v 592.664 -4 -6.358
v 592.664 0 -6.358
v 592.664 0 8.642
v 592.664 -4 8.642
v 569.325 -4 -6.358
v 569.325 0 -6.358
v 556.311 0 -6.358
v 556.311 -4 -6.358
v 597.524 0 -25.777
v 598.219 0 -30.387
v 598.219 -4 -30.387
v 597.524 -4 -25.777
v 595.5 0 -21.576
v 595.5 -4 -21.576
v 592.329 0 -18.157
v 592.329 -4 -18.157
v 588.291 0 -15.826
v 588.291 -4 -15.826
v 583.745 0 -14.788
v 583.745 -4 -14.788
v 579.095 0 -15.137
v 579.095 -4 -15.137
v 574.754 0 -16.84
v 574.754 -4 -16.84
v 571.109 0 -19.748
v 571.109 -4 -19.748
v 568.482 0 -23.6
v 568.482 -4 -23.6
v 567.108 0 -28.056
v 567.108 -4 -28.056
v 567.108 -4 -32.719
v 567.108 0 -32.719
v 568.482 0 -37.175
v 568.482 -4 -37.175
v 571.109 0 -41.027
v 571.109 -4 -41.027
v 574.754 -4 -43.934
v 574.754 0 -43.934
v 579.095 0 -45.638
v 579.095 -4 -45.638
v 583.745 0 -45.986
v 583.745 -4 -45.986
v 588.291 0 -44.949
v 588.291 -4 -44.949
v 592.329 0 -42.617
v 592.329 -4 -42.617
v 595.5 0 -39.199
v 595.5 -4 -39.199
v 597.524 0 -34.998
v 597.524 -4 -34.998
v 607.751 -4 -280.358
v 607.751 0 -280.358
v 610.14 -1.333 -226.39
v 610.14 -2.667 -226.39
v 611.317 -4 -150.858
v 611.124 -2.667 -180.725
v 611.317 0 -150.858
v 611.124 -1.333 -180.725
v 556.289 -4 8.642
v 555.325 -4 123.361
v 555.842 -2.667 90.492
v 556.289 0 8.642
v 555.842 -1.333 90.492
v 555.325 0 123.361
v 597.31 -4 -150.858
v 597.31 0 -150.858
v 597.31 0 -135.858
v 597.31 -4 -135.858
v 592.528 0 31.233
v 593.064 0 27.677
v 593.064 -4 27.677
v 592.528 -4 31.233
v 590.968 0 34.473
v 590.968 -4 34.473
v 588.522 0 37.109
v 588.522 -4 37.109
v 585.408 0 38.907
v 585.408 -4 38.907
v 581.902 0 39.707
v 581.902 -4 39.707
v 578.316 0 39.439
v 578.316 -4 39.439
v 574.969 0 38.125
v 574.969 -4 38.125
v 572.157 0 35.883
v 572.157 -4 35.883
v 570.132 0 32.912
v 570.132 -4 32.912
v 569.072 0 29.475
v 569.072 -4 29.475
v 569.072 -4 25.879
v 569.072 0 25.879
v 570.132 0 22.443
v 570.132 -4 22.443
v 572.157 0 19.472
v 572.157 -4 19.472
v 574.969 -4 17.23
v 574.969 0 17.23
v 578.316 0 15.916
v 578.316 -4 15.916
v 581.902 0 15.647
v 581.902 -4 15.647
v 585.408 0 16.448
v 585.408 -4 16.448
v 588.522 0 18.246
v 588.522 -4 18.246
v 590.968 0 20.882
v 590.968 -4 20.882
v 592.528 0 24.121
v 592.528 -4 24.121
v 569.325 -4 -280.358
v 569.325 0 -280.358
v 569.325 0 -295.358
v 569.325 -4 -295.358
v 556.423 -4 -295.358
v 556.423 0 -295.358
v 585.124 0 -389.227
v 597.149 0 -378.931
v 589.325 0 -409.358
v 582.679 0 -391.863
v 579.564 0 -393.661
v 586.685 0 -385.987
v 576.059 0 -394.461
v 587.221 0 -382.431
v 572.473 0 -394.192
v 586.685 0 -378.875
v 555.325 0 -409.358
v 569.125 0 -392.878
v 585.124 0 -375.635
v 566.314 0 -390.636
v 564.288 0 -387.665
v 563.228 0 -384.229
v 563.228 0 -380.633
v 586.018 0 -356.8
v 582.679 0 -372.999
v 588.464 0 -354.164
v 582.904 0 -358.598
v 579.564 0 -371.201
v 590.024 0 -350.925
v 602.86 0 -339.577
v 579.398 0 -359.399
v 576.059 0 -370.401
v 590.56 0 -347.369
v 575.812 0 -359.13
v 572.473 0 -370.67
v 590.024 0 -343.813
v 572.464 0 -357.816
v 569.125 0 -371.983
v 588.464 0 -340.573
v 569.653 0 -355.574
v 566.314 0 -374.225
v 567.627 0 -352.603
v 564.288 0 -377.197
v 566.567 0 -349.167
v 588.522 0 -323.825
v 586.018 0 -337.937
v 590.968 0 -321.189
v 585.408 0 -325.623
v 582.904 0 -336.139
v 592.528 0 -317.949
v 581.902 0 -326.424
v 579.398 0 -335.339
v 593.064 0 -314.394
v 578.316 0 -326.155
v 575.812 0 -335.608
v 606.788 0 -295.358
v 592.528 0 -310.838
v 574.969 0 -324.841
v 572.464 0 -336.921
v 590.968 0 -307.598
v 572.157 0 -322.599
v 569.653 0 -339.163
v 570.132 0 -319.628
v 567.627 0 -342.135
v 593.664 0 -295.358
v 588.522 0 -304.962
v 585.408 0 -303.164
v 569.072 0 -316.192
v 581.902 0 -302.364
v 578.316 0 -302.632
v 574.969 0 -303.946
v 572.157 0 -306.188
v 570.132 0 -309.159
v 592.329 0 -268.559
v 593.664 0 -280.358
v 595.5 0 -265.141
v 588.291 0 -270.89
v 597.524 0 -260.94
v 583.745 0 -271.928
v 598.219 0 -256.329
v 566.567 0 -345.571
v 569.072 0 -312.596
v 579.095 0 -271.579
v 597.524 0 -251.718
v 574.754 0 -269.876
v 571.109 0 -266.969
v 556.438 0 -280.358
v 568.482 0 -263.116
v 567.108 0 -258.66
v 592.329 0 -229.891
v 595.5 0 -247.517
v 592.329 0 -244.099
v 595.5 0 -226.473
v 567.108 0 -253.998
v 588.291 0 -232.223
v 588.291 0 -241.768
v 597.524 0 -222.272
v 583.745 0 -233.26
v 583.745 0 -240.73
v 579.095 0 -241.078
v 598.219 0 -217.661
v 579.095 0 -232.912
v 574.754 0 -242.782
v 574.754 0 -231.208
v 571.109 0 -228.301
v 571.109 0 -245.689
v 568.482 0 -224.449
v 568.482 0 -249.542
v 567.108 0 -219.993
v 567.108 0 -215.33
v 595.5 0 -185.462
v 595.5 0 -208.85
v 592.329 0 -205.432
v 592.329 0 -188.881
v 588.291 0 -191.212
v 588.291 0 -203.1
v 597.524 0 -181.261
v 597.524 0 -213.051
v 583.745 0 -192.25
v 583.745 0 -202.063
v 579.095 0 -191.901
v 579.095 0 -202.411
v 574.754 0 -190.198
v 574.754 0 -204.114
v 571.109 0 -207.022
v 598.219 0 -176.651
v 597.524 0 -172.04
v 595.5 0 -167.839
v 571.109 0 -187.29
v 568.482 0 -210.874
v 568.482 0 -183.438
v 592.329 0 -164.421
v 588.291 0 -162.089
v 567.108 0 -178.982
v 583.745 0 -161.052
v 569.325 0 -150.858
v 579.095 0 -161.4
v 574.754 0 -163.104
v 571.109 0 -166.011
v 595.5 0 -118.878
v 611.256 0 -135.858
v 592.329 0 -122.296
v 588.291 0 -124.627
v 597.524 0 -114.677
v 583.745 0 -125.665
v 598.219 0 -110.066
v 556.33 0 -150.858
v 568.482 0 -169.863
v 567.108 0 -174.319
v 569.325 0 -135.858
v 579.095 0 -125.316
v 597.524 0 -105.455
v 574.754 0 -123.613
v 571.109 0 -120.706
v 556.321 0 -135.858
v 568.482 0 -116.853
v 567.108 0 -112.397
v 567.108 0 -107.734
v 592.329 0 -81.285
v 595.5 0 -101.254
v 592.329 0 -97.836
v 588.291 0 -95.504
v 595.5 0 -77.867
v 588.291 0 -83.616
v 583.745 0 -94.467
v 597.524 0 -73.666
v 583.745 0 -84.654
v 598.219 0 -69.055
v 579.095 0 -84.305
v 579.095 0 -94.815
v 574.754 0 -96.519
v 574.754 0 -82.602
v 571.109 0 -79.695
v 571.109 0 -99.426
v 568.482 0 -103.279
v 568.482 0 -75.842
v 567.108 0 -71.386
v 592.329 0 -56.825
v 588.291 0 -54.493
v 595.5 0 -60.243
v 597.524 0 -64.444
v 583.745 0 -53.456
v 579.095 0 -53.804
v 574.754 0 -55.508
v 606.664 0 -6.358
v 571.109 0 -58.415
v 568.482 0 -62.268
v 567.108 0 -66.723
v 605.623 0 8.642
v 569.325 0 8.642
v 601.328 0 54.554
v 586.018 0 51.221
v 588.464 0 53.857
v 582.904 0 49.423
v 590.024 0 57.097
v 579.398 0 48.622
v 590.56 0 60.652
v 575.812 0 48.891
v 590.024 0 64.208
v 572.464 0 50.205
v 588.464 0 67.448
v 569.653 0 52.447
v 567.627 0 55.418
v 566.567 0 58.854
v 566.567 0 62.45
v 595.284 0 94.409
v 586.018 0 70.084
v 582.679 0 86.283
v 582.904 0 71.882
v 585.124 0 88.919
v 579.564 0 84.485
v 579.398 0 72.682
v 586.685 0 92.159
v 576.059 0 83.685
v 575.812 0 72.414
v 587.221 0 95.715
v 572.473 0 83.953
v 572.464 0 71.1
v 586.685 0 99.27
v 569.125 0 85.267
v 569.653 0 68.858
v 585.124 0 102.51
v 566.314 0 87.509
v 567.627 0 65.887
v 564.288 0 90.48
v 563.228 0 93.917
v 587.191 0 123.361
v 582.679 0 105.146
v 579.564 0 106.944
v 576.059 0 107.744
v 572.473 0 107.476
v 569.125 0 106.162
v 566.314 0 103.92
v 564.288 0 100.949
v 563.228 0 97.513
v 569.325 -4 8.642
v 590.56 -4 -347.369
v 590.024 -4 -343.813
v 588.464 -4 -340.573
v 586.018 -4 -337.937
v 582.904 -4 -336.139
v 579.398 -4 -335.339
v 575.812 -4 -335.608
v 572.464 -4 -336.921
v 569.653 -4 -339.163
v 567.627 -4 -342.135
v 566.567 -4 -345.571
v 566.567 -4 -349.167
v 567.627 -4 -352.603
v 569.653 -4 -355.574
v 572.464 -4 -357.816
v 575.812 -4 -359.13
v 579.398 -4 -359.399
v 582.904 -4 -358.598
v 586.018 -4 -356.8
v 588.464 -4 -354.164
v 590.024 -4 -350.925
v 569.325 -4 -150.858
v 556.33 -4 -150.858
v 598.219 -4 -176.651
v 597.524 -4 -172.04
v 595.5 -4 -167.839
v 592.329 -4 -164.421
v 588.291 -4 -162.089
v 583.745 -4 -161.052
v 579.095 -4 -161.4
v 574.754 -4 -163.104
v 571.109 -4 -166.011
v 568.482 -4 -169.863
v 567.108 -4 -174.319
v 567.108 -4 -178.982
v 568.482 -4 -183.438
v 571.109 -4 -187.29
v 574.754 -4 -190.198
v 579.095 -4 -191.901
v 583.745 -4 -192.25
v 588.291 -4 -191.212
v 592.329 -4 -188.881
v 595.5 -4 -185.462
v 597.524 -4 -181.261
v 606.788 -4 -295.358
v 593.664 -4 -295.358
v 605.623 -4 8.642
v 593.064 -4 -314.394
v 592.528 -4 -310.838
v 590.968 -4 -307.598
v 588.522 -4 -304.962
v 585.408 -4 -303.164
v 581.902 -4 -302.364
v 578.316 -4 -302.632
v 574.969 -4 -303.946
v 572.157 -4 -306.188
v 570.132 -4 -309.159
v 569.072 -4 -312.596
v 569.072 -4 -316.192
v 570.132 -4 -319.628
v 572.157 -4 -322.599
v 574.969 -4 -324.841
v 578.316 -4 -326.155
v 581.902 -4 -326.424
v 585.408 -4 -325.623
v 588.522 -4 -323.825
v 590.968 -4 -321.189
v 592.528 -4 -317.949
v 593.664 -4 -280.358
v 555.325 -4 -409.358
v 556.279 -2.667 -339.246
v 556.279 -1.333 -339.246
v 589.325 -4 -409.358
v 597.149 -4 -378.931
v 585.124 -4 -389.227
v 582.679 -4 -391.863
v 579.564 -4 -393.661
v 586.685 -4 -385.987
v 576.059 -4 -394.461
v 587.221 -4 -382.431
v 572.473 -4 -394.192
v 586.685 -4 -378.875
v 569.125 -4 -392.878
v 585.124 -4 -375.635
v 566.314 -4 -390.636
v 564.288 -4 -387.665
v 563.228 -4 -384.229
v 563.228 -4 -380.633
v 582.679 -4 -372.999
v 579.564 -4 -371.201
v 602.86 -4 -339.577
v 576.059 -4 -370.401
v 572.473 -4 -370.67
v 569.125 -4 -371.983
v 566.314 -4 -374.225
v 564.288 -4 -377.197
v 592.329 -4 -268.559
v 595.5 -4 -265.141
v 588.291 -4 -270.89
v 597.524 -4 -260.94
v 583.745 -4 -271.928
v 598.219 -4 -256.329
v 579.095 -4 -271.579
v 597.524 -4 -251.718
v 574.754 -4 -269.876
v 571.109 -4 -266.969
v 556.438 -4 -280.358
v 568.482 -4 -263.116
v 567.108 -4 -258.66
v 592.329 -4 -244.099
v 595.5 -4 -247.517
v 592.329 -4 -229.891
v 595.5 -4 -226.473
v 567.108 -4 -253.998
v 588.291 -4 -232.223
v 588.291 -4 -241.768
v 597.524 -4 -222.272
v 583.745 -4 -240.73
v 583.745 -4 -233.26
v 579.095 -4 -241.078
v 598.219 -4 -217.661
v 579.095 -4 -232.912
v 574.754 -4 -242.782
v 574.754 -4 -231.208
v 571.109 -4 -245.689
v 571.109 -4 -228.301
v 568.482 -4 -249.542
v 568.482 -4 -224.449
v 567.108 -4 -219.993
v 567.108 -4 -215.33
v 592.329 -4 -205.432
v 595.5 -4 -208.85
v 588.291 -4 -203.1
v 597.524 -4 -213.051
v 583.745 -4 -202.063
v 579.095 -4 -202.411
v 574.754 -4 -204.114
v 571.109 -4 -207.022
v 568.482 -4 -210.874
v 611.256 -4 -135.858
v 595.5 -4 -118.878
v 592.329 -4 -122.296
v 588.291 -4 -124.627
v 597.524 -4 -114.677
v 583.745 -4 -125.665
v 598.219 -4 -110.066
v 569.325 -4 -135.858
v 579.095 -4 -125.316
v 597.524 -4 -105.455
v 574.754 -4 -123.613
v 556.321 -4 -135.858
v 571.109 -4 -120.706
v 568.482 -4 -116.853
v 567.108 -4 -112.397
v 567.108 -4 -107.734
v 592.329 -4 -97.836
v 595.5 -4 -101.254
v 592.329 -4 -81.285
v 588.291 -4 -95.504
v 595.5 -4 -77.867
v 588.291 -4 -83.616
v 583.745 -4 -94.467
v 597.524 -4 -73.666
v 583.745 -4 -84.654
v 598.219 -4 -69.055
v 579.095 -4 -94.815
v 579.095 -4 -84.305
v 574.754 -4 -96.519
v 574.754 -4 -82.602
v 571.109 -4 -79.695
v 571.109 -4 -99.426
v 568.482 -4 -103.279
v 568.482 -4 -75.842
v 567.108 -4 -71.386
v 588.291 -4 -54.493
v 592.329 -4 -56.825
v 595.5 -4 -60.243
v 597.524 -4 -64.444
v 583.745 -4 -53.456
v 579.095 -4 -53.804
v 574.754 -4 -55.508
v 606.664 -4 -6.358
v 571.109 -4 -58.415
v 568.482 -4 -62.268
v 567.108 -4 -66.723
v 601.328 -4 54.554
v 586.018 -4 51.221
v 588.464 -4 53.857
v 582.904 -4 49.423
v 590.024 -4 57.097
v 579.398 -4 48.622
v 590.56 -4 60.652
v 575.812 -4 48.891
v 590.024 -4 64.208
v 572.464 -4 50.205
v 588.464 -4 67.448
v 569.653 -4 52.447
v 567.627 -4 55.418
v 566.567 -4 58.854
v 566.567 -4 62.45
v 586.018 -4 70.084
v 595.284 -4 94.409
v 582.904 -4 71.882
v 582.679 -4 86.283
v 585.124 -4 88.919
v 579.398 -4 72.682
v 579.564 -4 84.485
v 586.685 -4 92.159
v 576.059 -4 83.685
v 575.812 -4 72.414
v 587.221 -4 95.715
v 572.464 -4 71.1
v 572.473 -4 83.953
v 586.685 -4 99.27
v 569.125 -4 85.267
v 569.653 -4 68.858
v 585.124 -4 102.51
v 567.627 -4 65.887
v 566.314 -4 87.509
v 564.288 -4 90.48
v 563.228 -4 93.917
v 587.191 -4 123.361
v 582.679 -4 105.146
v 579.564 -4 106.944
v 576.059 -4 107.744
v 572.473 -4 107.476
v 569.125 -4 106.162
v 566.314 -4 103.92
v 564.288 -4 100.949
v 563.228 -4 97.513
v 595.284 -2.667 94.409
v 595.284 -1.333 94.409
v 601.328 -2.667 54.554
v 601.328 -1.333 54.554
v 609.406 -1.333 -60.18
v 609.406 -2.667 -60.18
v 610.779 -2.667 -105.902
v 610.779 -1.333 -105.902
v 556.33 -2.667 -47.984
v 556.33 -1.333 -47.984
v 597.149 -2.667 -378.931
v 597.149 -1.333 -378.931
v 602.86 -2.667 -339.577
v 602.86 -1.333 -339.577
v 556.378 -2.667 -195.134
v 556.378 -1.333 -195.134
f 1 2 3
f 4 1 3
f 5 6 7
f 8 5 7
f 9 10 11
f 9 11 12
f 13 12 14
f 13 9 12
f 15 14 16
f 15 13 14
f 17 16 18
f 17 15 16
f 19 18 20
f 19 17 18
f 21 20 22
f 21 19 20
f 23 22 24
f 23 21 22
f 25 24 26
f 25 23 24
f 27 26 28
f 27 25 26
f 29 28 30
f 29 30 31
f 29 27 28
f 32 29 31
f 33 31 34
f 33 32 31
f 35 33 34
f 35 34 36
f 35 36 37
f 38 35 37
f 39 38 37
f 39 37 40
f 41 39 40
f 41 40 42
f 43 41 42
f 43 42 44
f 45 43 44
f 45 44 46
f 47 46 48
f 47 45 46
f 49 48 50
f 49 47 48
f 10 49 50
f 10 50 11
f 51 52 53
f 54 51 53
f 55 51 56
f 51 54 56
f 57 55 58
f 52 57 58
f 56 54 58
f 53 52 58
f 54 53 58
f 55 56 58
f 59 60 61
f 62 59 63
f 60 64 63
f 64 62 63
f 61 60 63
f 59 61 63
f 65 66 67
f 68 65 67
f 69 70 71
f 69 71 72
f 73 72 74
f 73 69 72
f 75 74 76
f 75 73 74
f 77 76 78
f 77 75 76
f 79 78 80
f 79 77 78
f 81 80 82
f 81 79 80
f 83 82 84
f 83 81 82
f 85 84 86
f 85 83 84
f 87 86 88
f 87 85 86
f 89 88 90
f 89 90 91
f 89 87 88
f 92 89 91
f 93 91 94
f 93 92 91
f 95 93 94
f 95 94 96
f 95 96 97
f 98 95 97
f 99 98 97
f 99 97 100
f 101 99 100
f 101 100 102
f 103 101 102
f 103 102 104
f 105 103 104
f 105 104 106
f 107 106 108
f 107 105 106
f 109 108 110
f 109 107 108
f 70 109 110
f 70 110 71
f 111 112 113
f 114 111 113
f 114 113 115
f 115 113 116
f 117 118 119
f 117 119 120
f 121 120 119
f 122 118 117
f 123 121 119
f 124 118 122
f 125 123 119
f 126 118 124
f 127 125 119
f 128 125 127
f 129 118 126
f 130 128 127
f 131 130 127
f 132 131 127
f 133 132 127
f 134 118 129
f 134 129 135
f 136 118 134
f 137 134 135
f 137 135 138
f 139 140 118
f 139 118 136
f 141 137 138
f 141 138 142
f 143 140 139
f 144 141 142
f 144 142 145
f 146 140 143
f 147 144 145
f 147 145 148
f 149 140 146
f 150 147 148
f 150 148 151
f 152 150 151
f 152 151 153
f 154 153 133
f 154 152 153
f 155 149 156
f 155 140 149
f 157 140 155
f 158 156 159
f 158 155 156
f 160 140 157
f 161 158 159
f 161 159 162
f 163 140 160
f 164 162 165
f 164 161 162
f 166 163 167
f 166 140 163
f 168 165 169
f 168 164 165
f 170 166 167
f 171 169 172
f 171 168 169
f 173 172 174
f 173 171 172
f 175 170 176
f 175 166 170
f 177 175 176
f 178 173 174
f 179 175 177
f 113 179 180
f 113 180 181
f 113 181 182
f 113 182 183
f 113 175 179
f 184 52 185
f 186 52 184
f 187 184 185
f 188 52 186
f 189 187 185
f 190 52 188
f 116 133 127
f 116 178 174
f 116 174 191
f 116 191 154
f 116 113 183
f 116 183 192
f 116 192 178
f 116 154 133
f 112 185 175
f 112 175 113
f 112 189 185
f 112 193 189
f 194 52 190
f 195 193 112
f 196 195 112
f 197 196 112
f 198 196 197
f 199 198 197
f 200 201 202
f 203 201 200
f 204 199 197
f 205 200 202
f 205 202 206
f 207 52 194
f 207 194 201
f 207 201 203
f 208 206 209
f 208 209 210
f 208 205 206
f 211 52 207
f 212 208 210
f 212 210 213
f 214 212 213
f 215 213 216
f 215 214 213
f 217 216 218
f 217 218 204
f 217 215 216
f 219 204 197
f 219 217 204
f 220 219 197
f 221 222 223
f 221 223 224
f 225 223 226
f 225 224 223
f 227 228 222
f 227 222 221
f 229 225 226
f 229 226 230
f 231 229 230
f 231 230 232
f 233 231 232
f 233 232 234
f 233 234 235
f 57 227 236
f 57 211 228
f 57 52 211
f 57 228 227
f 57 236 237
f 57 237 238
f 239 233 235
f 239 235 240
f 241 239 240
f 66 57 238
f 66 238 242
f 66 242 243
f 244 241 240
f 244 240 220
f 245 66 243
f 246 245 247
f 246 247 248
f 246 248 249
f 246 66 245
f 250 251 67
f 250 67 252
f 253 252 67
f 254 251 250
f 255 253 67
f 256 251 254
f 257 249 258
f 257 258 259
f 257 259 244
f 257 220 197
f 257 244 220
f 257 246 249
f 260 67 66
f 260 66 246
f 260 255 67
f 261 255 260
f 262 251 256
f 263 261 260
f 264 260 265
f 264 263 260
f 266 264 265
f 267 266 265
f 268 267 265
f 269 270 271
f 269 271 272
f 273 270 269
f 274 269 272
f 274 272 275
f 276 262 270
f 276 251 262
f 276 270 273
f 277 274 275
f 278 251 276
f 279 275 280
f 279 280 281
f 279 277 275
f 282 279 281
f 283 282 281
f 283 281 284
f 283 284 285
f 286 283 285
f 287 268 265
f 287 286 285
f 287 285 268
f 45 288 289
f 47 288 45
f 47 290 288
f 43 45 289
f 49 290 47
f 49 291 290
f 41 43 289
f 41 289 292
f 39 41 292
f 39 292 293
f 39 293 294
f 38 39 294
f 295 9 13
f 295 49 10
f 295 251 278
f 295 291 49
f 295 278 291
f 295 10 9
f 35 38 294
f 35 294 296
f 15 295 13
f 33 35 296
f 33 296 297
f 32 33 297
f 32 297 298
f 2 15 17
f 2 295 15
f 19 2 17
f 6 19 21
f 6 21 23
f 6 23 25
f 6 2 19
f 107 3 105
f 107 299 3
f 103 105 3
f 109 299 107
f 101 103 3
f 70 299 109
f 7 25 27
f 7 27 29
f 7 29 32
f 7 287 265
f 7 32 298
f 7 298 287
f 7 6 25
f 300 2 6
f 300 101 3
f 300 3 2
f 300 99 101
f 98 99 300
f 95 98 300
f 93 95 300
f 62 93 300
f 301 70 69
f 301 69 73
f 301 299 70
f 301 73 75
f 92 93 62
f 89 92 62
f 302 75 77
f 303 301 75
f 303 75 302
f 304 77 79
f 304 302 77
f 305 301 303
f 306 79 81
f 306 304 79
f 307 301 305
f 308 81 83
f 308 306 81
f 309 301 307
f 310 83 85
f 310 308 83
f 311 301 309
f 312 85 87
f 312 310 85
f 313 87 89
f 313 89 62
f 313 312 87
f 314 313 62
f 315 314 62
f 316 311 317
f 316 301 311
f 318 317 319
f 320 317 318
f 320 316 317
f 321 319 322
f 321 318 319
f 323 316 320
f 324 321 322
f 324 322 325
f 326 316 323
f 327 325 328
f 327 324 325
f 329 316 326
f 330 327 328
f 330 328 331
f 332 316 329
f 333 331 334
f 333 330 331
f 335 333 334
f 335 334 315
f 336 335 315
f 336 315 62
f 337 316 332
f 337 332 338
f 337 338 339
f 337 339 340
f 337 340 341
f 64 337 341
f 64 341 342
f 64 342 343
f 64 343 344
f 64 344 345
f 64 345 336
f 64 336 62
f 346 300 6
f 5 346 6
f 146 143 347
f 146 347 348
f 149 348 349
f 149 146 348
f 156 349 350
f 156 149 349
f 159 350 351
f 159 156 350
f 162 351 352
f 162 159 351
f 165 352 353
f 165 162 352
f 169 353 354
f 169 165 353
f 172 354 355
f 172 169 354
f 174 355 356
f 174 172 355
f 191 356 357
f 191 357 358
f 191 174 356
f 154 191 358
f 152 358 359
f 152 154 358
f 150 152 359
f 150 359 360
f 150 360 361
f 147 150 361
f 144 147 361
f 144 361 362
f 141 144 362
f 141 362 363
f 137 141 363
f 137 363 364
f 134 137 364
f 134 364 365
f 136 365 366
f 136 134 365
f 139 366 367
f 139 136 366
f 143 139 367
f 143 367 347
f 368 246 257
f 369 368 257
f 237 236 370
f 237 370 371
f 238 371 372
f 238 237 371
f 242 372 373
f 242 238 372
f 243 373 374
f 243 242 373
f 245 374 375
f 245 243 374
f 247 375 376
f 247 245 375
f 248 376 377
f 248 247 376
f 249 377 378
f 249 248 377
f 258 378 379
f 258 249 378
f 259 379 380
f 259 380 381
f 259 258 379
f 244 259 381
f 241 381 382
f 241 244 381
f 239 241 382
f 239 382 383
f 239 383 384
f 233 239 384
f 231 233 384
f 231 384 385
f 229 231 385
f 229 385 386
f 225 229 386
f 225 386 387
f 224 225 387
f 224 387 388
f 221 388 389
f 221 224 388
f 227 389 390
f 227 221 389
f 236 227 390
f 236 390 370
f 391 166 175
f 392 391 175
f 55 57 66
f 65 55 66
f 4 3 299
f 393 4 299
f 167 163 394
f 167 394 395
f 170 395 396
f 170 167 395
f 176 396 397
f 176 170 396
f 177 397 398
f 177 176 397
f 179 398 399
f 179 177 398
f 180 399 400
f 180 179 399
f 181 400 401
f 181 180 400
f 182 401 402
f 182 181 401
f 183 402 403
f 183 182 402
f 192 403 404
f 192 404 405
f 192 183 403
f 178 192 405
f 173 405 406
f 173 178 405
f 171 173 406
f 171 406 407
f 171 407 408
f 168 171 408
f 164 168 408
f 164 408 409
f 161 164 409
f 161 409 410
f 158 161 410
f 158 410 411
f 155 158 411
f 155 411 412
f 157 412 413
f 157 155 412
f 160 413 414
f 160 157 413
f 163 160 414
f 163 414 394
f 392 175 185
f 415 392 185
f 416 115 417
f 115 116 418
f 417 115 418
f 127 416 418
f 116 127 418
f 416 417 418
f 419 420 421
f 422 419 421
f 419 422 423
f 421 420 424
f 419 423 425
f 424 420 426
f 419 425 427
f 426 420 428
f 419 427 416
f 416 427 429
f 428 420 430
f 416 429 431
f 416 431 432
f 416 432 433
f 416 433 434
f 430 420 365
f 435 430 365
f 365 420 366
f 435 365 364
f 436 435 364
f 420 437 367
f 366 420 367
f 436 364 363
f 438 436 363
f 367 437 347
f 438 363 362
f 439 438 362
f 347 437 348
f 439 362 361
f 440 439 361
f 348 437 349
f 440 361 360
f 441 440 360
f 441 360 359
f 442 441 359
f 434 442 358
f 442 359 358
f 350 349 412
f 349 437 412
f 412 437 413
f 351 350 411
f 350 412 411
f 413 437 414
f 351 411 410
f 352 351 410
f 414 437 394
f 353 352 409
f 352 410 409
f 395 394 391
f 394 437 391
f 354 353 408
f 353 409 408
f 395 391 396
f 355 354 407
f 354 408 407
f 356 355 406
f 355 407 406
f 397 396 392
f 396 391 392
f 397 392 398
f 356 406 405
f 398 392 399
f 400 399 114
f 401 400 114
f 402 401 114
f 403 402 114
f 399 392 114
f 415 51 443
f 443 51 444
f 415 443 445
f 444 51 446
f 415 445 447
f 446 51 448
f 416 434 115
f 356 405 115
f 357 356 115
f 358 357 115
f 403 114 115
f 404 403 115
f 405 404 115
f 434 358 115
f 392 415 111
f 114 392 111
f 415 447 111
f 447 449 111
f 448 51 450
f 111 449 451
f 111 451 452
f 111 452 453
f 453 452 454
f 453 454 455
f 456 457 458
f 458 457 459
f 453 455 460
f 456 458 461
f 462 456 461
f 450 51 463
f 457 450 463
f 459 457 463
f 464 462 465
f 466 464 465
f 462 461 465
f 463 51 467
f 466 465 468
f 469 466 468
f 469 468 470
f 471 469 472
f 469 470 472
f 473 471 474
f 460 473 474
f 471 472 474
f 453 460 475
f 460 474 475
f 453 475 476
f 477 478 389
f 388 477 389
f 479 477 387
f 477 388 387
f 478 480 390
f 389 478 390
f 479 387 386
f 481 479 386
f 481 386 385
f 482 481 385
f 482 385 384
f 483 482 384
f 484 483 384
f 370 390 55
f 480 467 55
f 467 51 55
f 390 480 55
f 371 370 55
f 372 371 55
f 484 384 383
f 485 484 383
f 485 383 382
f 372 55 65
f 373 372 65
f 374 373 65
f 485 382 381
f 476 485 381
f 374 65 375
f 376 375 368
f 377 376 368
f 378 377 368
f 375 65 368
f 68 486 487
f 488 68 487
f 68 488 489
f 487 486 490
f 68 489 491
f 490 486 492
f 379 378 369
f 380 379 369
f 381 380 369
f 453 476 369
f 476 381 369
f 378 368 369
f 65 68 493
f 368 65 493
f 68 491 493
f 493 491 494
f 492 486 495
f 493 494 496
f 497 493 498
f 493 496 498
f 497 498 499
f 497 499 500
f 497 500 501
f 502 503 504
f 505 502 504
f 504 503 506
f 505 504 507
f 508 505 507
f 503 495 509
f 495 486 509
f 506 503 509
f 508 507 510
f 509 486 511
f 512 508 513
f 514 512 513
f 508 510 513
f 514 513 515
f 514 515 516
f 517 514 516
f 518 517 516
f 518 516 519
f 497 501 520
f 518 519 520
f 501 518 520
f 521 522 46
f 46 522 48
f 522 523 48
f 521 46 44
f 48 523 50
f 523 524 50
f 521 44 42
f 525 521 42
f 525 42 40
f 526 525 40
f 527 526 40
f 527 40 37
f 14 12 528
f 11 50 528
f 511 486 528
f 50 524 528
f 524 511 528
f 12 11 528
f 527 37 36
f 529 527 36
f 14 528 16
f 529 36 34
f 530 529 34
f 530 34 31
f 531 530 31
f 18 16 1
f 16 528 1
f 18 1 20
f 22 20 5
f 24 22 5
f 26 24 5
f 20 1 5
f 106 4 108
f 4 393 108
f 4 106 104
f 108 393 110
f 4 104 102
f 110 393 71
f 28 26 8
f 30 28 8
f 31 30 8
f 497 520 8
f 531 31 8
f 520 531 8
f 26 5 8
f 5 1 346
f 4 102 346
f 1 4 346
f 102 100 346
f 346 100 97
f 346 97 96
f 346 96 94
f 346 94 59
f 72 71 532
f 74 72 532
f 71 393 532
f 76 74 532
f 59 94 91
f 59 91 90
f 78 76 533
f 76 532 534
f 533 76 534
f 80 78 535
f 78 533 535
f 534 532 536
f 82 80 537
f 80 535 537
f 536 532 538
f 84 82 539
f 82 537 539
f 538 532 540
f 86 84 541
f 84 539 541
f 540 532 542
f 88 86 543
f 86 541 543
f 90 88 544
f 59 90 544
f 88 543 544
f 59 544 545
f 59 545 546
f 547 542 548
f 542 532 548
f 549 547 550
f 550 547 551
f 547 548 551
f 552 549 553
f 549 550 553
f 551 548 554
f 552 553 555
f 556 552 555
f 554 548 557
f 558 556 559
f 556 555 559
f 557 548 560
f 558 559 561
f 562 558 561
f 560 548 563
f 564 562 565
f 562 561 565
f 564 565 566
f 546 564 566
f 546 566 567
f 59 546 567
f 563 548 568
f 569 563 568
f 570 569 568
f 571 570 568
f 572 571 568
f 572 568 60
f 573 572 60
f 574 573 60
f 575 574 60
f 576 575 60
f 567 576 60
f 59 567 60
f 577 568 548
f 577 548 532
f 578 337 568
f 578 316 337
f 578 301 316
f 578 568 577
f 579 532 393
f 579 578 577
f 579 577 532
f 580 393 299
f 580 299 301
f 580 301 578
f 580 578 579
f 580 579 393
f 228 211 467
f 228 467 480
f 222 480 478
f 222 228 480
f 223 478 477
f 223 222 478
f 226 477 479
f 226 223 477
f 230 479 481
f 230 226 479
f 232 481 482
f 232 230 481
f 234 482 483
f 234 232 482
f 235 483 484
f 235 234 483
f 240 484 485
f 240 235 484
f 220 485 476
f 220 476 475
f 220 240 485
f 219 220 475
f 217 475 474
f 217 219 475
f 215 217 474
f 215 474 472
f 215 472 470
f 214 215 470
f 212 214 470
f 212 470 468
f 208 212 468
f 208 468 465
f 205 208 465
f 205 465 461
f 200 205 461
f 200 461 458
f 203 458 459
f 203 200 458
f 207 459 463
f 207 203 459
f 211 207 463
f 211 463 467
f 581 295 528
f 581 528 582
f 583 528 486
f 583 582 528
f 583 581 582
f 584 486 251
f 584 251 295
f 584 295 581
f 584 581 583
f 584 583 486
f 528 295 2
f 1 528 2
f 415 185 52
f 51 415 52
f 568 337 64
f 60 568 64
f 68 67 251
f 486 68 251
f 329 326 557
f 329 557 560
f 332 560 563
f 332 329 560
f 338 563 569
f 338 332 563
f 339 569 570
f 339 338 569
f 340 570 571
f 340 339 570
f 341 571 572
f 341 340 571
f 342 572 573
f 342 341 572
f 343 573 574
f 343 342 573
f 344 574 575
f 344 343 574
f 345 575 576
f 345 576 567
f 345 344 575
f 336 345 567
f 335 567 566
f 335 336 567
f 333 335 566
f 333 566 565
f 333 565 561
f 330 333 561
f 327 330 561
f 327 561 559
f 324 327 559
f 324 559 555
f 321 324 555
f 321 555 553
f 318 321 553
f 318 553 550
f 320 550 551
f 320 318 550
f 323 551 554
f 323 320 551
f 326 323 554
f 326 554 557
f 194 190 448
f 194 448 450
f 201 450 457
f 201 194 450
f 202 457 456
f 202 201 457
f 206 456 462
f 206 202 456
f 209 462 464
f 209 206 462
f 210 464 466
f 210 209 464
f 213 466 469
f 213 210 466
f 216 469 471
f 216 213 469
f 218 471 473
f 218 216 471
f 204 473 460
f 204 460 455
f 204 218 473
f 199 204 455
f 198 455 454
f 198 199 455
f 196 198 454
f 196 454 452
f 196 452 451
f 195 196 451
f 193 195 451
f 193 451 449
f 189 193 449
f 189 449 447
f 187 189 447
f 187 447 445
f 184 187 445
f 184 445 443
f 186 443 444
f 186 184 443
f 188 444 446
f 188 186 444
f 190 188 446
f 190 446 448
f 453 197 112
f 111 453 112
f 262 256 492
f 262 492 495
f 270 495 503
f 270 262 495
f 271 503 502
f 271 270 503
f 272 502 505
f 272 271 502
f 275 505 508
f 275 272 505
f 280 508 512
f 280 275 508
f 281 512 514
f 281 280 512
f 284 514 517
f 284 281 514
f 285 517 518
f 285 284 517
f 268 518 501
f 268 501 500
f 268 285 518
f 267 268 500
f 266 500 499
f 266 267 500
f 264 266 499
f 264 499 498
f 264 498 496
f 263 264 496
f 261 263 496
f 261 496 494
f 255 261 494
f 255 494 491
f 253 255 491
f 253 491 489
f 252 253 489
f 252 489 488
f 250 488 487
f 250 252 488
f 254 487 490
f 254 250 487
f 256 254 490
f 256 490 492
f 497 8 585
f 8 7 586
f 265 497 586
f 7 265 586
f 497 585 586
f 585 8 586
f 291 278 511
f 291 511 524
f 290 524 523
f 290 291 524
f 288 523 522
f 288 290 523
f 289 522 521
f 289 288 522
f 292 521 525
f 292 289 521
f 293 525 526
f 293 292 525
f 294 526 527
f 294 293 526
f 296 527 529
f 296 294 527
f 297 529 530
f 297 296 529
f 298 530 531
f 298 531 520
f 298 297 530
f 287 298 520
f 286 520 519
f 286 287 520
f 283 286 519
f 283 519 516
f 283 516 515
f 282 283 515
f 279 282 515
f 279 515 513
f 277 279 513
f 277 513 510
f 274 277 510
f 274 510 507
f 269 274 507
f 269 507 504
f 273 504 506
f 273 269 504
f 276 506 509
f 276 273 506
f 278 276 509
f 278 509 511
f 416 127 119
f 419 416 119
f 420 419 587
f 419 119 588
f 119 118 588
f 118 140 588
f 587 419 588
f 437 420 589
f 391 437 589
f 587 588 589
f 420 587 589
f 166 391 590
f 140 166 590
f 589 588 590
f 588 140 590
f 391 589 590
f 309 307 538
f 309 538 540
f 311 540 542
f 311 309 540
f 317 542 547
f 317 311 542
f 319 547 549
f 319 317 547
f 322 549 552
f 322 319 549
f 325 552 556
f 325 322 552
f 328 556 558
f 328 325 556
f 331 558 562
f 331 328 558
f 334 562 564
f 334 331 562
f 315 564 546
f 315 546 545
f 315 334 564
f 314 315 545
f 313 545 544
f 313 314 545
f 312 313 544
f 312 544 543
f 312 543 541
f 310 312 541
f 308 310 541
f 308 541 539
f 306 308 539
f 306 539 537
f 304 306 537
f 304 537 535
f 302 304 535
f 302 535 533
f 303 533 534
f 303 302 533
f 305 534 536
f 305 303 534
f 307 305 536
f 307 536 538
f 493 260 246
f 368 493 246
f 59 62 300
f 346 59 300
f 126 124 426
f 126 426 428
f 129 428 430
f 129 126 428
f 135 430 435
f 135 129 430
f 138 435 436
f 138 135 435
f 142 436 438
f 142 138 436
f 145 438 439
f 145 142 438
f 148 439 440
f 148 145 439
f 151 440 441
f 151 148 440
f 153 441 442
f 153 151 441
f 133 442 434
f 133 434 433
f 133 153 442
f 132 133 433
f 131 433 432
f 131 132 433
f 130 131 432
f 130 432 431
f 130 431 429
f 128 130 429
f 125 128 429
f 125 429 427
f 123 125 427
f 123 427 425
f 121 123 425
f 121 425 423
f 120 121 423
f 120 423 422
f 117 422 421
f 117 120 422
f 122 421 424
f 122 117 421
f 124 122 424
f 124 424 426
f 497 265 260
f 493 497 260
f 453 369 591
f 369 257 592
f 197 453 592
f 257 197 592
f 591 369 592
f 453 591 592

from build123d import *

# Parameters (mm, degrees)
F0_R     = 15.6427266016
F0_R_2   = 12.0636627394
F1_DEPTH = 4


# Not quite as in the source:
# - a feature names something its author has since deleted; it is built from what else it names


with BuildPart() as f1:
    # F0 (on Front) → F1 (new body)
    with BuildSketch(Plane.XZ):
        with BuildLine():
            add(Edge.make_bspline(
                [(606.664408162, -6.3581708061), (610.2484126071, -61.6736918338), (611.0695149221, -116.339928141), (611.2557314215, -135.8581708061)],
                knots=[116.1389128405, 116.1389128405, 116.1389128405, 116.1389128405, 238.5747877883, 238.5747877883, 238.5747877883, 238.5747877883], degree=3))
            Line((606.664408162, -6.3581708061), (592.664408162, -6.3581708061))
            Line((592.664408162, -6.3581708061), (592.664408162, 1.1418291939))
            Line((592.664408162, 1.1418291939), (569.3247318268, 1.1418291939))
            Line((569.3247318268, 1.1418291939), (569.3247318268, -6.3581708061))
            Line((569.3247318268, -6.3581708061), (556.3105202547, -6.3581708061))
            add(Edge.make_bspline(
                [(556.3105202547, -6.3581708062), (556.3560675182, -46.8595634464), (556.3040983749, -91.0874507126), (556.321195241, -135.8581708062)],
                knots=[0.2731602209, 0.2731602209, 0.2731602209, 0.2731602209, 0.4883298337, 0.4883298337, 0.4883298337, 0.4883298337], degree=3))
            Line((556.321195241, -135.8581708061), (569.3247318268, -135.8581708061))
            Line((569.3247318268, -135.8581708061), (569.3247318268, -143.3581708061))
            Line((569.3247318268, -143.3581708061), (597.3095011307, -143.3581708061))
            Line((597.3095011307, -143.3581708061), (597.3095011307, -135.8581708061))
            Line((597.3095011307, -135.8581708061), (611.2557314215, -135.8581708061))
        make_face()
        with Locations((582.5758576393, -110.06578058)):
            Circle(F0_R, mode=Mode.SUBTRACT)
        with Locations((582.5758576393, -69.0548494458)):
            Circle(F0_R, mode=Mode.SUBTRACT)
        with Locations((582.5758576393, -30.3874015808)):
            Circle(F0_R, mode=Mode.SUBTRACT)
        with BuildLine():
            add(Edge.make_bspline(
                [(587.1910579171, 123.3613954191), (596.407592129, 101.4742246466), (602.1031854422, 55.9678384662), (605.6225226157, 8.6418291939)],
                knots=[0, 0, 0, 0, 105.0647905127, 105.0647905127, 105.0647905127, 105.0647905127], degree=3))
            Line((587.1910579171, 123.3613954191), (563.1910579171, 123.3613954191))
            Line((563.1910579171, 123.3613954191), (555.3247318268, 123.3613954191))
            add(Edge.make_bspline(
                [(555.3247318268, 123.3613954191), (555.9675431408, 93.7069693731), (556.2055580917, 53.8758795815), (556.2885566673, 8.6418291939)],
                knots=[0, 0, 0, 0, 0.2462769496, 0.2462769496, 0.2462769496, 0.2462769496], degree=3))
            Line((556.2885566673, 8.6418291939), (569.3247318268, 8.6418291939))
            Line((569.3247318268, 8.6418291939), (569.3247318268, 1.1418291939))
            Line((569.3247318268, 1.1418291939), (592.664408162, 1.1418291939))
            Line((592.664408162, 1.1418291939), (592.664408162, 8.6418291939))
            Line((592.664408162, 8.6418291939), (605.6225226157, 8.6418291939))
        make_face()
        with Locations((581.0006856918, 27.6772994548)):
            Circle(F0_R_2, mode=Mode.SUBTRACT)
        with Locations((575.1569867134, 95.7145318389)):
            Circle(F0_R_2, mode=Mode.SUBTRACT)
        with Locations((578.4962773323, 60.652397573)):
            Circle(F0_R_2, mode=Mode.SUBTRACT)
        with BuildLine():
            add(Edge.make_bspline(
                [(607.7513419726, -280.3581708061), (611.0463615473, -224.7368336409), (611.3157540895, -170.3281819541), (611.3171415076, -150.8581708061)],
                knots=[112.8825860344, 112.8825860344, 112.8825860344, 112.8825860344, 237.6045572103, 237.6045572103, 237.6045572103, 237.6045572103], degree=3))
            Line((611.3171415076, -150.8581708061), (611.3095011307, -150.8581708061))
            Line((611.3095011307, -150.8581708061), (597.3095011307, -150.8581708061))
            Line((597.3095011307, -150.8581708061), (597.3095011307, -143.3581708061))
            Line((597.3095011307, -143.3581708061), (569.3247318268, -143.3581708061))
            Line((569.3247318268, -143.3581708061), (569.3247318268, -150.8581708061))
            Line((569.3247318268, -150.8581708061), (556.3296648649, -150.8581708061))
            add(Edge.make_bspline(
                [(556.3296648649, -150.8581708062), (556.3627723501, -195.2400977423), (556.4619608218, -239.7521985209), (556.4380859402, -280.3581708061)],
                knots=[0.5123348883, 0.5123348883, 0.5123348883, 0.5123348883, 0.7252628697, 0.7252628697, 0.7252628697, 0.7252628697], degree=3))
            Line((556.4380859402, -280.3581708061), (569.3247318268, -280.3581708061))
            Line((569.3247318268, -280.3581708061), (569.3247318268, -287.8581708061))
            Line((569.3247318268, -287.8581708061), (569.3247318268, -295.3581708061))
            Line((569.3247318268, -295.3581708061), (556.4230475774, -295.3581708061))
            add(Edge.make_bspline(
                [(556.4230475774, -295.3581708061), (556.3560187283, -341.4793760002), (556.0897539461, -381.6099515969), (555.3247318268, -409.3581708061)],
                knots=[0.7518138312, 0.7518138312, 0.7518138312, 0.7518138312, 1, 1, 1, 1], degree=3))
            Line((555.3247318268, -409.3581708061), (556.8649172783, -409.3581708061))
            Line((556.8649172783, -409.3581708061), (589.3247318268, -409.3581708061))
            add(Edge.make_bspline(
                [(589.3247318268, -409.3581708061), (598.3171301483, -384.7473411865), (603.6401377777, -340.6568702112), (606.7877271908, -295.3581708061)],
                knots=[0, 0, 0, 0, 101.6745497642, 101.6745497642, 101.6745497642, 101.6745497642], degree=3))
            Line((606.7877271908, -295.3581708061), (605.6225226157, -295.3581708061))
            Line((605.6225226157, -295.3581708061), (593.664408162, -295.3581708061))
            Line((593.664408162, -295.3581708061), (593.664408162, -280.3581708061))
            Line((593.664408162, -280.3581708061), (606.664408162, -280.3581708061))
            Line((606.664408162, -280.3581708061), (607.7513419726, -280.3581708061))
        make_face()
        with Locations((575.1569867134, -382.4308734512)):
            Circle(F0_R_2, mode=Mode.SUBTRACT)
        with Locations((578.4962773323, -347.3687391853)):
            Circle(F0_R_2, mode=Mode.SUBTRACT)
        with Locations((581.0006856918, -314.3936410671)):
            Circle(F0_R_2, mode=Mode.SUBTRACT)
        with Locations((582.5758576393, -256.3289400315)):
            Circle(F0_R, mode=Mode.SUBTRACT)
        with Locations((582.5758576393, -217.6614921665)):
            Circle(F0_R, mode=Mode.SUBTRACT)
        with Locations((582.5758576393, -176.6505610322)):
            Circle(F0_R, mode=Mode.SUBTRACT)
    extrude(amount=F1_DEPTH)


solid = f1.part
